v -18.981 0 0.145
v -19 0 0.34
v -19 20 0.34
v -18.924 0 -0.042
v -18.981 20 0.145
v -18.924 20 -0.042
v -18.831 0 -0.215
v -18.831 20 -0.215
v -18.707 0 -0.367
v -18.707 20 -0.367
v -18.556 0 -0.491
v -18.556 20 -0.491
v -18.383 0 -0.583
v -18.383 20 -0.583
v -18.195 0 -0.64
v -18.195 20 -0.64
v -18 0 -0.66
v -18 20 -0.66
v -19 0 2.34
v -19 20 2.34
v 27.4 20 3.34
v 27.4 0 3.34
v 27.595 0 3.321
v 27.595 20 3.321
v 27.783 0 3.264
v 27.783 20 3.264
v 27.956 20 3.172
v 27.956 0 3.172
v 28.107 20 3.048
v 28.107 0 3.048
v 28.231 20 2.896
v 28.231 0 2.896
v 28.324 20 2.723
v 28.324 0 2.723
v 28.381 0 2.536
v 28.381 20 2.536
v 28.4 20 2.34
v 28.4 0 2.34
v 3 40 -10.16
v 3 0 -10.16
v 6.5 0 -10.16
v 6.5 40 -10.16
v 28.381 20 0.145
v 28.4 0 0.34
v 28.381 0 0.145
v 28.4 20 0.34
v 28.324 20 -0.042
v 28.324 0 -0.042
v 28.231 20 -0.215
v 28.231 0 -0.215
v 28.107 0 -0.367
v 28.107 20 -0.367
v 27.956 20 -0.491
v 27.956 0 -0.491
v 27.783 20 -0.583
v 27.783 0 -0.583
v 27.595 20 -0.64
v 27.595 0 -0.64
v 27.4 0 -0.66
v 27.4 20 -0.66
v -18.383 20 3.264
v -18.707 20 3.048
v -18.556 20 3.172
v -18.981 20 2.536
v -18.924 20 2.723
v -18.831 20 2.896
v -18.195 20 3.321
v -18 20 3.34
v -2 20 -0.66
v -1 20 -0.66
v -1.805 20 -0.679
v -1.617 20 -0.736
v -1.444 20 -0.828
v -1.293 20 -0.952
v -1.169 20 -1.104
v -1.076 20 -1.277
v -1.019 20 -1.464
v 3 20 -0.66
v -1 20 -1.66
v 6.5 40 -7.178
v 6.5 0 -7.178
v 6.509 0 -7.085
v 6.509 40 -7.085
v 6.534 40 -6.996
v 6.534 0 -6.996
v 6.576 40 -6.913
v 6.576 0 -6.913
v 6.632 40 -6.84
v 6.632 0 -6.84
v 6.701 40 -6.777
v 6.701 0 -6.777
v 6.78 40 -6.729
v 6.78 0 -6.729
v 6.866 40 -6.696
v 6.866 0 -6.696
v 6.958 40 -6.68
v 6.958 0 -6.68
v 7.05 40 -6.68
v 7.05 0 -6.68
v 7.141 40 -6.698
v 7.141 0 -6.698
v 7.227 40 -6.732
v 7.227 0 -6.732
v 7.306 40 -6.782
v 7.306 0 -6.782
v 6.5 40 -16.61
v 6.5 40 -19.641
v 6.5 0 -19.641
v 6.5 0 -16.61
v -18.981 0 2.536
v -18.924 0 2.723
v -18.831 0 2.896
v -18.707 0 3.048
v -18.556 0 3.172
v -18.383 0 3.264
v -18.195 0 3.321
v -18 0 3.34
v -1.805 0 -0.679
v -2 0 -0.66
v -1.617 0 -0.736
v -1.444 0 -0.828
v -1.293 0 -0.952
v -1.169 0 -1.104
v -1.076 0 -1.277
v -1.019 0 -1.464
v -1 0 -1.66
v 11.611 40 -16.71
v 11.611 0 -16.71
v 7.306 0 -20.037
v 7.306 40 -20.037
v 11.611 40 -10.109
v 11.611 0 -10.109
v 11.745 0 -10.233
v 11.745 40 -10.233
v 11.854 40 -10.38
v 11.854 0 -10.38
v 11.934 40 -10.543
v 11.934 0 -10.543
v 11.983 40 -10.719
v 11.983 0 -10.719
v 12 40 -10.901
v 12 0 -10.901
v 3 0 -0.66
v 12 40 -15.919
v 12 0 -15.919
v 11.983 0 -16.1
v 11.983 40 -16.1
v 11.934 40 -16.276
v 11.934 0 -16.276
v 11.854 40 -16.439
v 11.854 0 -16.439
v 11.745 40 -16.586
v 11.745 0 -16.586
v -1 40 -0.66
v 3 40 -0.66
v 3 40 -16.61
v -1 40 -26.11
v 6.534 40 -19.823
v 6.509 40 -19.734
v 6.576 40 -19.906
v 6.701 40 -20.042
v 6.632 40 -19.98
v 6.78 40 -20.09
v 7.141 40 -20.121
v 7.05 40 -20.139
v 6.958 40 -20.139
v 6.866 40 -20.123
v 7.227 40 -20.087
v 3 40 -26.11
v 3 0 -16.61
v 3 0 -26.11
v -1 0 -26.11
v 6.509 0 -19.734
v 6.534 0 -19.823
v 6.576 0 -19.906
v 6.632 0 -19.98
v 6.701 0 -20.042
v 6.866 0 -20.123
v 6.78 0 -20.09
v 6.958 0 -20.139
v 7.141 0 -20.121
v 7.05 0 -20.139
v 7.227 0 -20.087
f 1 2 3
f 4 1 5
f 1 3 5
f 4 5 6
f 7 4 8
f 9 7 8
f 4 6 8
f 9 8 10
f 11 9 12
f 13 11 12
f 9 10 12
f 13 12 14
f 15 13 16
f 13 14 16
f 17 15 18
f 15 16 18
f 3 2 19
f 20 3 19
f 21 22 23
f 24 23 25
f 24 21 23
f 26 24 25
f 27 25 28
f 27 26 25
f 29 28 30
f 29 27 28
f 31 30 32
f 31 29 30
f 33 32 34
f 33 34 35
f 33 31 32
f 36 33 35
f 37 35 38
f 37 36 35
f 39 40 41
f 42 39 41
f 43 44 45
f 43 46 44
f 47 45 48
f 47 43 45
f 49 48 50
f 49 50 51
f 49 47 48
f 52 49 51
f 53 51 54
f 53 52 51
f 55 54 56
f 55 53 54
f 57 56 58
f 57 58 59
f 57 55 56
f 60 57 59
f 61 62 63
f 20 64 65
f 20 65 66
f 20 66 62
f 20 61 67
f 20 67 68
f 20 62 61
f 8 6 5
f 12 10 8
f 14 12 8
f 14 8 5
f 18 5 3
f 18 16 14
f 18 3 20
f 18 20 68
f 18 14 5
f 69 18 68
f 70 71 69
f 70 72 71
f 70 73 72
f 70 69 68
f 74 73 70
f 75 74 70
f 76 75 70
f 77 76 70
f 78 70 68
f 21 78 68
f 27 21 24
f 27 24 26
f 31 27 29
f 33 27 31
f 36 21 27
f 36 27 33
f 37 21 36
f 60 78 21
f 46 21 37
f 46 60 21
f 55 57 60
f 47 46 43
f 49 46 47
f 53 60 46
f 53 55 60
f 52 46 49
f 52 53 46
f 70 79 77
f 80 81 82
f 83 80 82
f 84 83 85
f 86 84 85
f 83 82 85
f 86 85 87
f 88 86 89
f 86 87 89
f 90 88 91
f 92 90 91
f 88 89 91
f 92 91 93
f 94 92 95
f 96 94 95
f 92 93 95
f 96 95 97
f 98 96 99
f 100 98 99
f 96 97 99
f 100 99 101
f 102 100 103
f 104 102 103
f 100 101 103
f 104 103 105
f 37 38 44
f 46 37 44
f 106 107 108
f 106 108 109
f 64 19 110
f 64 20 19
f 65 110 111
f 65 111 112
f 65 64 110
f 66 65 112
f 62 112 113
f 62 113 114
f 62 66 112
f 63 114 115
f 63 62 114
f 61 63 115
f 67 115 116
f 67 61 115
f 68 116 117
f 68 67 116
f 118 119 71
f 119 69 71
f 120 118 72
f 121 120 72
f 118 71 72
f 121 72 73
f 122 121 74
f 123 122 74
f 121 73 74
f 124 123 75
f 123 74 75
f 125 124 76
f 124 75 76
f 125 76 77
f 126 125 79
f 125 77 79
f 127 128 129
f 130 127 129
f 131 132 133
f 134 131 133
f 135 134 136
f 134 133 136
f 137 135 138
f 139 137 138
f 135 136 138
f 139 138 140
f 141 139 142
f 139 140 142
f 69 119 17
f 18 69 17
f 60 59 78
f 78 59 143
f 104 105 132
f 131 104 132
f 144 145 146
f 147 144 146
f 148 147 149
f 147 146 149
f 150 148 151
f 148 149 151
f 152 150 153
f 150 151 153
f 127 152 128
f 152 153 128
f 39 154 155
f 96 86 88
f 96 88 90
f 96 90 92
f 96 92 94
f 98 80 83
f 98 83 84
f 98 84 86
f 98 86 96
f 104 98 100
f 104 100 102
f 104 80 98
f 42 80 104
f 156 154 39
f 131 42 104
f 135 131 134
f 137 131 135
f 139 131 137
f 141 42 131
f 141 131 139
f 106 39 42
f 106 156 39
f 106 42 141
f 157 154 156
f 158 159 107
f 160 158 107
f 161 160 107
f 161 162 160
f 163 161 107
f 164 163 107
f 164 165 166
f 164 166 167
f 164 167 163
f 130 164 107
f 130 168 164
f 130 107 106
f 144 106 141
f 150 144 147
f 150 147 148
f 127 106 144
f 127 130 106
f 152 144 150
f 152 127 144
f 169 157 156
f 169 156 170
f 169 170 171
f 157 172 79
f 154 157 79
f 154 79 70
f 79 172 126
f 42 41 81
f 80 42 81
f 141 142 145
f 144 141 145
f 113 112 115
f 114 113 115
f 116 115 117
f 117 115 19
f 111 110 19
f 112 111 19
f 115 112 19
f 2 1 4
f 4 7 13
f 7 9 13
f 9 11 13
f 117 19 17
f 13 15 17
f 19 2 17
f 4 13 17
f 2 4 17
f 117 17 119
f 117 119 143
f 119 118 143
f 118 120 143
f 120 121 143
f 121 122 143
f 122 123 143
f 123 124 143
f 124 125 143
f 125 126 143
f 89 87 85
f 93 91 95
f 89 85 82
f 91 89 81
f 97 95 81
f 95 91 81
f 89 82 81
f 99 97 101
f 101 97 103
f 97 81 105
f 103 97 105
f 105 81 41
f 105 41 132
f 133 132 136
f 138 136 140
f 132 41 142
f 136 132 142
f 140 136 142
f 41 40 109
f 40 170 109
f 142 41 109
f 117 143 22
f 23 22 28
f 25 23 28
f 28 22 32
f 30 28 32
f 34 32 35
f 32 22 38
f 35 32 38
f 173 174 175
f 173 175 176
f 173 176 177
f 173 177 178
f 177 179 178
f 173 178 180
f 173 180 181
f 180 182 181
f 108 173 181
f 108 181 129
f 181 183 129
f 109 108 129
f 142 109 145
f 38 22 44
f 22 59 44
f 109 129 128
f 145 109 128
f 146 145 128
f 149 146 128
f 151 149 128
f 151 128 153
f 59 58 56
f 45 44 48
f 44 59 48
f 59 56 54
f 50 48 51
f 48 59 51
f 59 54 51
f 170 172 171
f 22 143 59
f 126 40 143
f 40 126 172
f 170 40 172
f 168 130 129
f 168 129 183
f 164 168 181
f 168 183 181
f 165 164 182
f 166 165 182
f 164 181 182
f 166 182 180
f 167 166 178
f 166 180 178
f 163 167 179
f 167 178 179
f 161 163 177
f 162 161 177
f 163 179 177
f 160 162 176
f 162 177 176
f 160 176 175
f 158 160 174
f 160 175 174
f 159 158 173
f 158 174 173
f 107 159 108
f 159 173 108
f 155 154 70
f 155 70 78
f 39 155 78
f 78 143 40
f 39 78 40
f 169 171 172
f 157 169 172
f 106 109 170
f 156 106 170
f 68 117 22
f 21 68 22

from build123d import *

# Parameters (mm, degrees)
MAIN_EXTRUDE_DEPTH = 40
CUT_EXTRUDE1_START = -4
SKETCH4_W          = 47.4
SKETCH4_H          = 20
CUT_EXTRUDE1_DEPTH = 4
FILLET1_R          = 1
FILLET2_R          = 1
FILLET3_R          = 1


with BuildPart() as part:
    # Sketch1 → Main-Extrude (new body)
    with BuildSketch(Plane(origin=(0, 0, 0), x_dir=(1, 0, 0), z_dir=(0, 1, 0))):
        with BuildLine():
            Line((6.5, 10.159541063), (6.5, 7.17778828))
            ThreePointArc((6.5, 7.17778828), (6.779616102, 6.728977699), (7.305723751, 6.782145779))
            Line((7.305723751, 6.782145779), (11.611447501, 10.10929595))
            ThreePointArc((11.611447501, 10.10929595), (11.897621162, 10.459813156), (12, 10.900580951))
            Line((12, 10.900580951), (12, 15.918501174))
            ThreePointArc((12, 15.918501174), (11.897621162, 16.35926897), (11.611447501, 16.709786176))
            Line((11.611447501, 16.709786176), (7.305723751, 20.036936346))
            ThreePointArc((7.305723751, 20.036936346), (6.779616102, 20.090104427), (6.5, 19.641293846))
            Line((6.5, 19.641293846), (6.5, 16.609541063))
            Line((6.5, 16.609541063), (3, 16.609541063))
            Line((3, 16.609541063), (3, 26.109541063))
            Line((3, 26.109541063), (-1, 26.109541063))
            Line((-1, 26.109541063), (-1, 0.659541063))
            Line((-1, 0.659541063), (-19, 0.659541063))
            Line((-19, 0.659541063), (-19, -3.340458937))
            Line((-19, -3.340458937), (-4.999912017, -3.340458937))
            Line((-4.999912017, -3.340458937), (28.4, -3.340458937))
            Line((28.4, -3.340458937), (28.4, 0.659541063))
            Line((28.4, 0.659541063), (3, 0.659541063))
            Line((3, 0.659541063), (3, 10.159541063))
            Line((3, 10.159541063), (6.5, 10.159541063))
        make_face()
    extrude(amount=MAIN_EXTRUDE_DEPTH)

    # Sketch4 → Cut-Extrude1 (cut)
    with BuildSketch(Plane.XY.offset(3.340458937).offset(CUT_EXTRUDE1_START)):
        with Locations((4.7, 30)):
            Rectangle(SKETCH4_W, SKETCH4_H)
    extrude(amount=CUT_EXTRUDE1_DEPTH, mode=Mode.SUBTRACT)

    # Fillet1
    fillet1_edges = [part.edges().sort_by_distance(p)[0] for p in [
        (28.4, 10, 3.340458937),
        (-19, 10, 3.340458937),
        (28.4, 10, -0.659541063),
    ]]
    fillet(fillet1_edges, radius=FILLET1_R)

    # Fillet2
    fillet2_edges = [part.edges().sort_by_distance(p)[0] for p in [
        (-19, 10, -0.659541063),
    ]]
    fillet(fillet2_edges, radius=FILLET2_R)

    # Fillet3
    fillet3_edges = [part.edges().sort_by_distance(p)[0] for p in [
        (-1, 10, -0.659541063),
    ]]
    fillet(fillet3_edges, radius=FILLET3_R)


solid = part.part
